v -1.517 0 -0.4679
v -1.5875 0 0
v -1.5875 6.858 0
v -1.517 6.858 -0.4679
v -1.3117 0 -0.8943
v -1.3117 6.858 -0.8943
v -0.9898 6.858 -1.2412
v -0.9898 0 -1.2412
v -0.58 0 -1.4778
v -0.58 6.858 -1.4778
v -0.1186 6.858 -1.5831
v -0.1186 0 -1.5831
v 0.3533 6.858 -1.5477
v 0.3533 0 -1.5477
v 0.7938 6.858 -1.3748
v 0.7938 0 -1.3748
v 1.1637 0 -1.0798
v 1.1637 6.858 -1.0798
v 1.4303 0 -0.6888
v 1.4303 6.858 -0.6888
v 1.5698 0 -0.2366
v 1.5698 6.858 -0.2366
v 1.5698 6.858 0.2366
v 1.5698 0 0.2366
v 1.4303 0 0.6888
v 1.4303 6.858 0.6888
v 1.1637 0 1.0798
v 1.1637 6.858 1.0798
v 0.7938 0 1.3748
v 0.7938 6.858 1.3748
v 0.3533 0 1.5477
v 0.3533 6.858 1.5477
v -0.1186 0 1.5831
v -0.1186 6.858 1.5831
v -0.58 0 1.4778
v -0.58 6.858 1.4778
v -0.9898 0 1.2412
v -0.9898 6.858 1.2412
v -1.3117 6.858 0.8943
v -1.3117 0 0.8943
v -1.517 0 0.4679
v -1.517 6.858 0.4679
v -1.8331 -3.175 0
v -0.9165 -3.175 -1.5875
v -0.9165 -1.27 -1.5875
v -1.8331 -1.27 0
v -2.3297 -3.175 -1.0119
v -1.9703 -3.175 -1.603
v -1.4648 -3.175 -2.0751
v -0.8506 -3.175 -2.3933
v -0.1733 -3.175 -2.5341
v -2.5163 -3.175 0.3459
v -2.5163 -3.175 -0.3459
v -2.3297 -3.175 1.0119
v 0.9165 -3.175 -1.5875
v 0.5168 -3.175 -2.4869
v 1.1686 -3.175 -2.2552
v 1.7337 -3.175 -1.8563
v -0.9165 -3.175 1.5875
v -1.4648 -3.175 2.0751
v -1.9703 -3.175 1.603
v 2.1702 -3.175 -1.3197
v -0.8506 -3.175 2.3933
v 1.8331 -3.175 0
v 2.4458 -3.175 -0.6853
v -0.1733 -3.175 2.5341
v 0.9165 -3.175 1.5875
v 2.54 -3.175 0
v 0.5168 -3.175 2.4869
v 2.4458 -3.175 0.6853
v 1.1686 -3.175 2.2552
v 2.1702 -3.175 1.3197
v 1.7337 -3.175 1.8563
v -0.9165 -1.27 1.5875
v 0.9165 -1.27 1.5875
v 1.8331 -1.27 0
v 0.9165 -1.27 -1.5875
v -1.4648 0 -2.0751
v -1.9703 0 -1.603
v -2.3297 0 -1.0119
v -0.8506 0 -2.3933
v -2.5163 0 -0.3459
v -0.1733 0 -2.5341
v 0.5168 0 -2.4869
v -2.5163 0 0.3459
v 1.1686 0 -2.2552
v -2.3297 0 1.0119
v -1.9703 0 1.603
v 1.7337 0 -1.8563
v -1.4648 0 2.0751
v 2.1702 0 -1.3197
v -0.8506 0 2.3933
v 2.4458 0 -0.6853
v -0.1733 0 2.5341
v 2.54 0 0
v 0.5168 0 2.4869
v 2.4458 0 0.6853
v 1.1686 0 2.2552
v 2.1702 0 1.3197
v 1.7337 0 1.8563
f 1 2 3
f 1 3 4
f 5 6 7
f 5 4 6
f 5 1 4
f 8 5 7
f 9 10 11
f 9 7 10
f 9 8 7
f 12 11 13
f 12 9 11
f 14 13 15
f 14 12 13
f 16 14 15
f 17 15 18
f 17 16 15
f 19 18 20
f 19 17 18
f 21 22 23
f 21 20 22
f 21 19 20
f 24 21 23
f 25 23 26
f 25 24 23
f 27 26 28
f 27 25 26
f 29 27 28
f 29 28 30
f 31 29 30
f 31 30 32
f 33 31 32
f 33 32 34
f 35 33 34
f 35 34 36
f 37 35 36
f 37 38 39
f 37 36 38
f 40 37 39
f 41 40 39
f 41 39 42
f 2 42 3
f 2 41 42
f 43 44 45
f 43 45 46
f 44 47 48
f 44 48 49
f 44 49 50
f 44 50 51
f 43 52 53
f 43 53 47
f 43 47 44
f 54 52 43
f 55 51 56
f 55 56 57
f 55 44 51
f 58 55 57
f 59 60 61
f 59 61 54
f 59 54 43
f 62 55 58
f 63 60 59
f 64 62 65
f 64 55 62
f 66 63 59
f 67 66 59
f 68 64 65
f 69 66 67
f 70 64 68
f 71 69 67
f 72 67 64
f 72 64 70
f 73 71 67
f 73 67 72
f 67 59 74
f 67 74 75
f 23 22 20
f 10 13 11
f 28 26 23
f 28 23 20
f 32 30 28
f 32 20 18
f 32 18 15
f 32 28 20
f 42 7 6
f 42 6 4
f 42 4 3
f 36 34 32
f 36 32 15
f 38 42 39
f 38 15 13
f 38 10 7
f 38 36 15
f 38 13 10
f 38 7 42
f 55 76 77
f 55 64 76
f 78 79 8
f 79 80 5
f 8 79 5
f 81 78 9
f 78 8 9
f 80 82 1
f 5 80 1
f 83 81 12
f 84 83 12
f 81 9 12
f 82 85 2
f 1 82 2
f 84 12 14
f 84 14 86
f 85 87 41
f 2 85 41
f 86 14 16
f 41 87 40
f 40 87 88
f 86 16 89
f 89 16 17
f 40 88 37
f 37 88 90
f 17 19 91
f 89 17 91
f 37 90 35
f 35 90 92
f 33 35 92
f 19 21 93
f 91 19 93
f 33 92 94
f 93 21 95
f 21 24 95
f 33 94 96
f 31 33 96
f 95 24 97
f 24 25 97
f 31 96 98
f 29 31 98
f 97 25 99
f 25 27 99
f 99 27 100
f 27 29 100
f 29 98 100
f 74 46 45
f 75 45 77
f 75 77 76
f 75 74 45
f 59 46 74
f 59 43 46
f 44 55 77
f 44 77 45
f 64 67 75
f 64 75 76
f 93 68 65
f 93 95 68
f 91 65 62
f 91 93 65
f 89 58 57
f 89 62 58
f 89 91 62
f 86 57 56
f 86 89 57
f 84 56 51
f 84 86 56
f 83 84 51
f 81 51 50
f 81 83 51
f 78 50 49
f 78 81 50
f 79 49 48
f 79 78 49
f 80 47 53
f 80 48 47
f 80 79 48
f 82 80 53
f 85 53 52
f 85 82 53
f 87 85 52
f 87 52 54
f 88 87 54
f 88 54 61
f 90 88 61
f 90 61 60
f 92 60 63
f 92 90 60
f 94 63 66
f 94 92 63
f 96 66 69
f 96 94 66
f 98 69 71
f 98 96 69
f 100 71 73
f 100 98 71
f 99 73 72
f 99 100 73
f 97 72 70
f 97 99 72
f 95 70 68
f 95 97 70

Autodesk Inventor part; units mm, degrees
ref_plane "YZ Plane" through (0, 0, 0) normal (1, 0, 0) x (0, 1, 0)
ref_plane "XZ Plane" through (0, 0, 0) normal (0, 1, 0) x (-1, 0, 0)
ref_plane "XY Plane" through (0, 0, 0) normal (0, 0, 1) x (1, 0, 0)
sketch "Sketch1" plane through (0, 0, 0) normal (0, 1, 0) x (-1, 0, 0)
  circle A0 centre (0, 0) radius 1.5875
  dimension "d0" = 3.175
extrude "Extrusion1" add sketch "Sketch1" along normal blind 6.858
sketch "Sketch2" plane through (0, 0, 0) normal (0, -1, 0) x (1, 0, 0)
  circle A0 centre (0, 0) radius 2.54
  dimension "d3" = 5.08
extrude "Extrusion2" add sketch "Sketch2" along normal blind 3.175
sketch "Sketch3" plane through (0, -3.175, 0) normal (0, -1, 0) x (1, 0, 0)
  line L0 (1.8331, 0) -> (0.9165, -1.5875)
  line L1 (0.9165, -1.5875) -> (-0.9165, -1.5875)
  line L2 (-0.9165, -1.5875) -> (-1.8331, 0)
  line L3 (-1.8331, 0) -> (-0.9165, 1.5875)
  line L4 (-0.9165, 1.5875) -> (0.9165, 1.5875)
  line L5 (0.9165, 1.5875) -> (1.8331, 0)
  point P0 (0, 0)
  point P1 (0, 0)
  dimension "d6" = 3.175
extrude "Extrusion3" cut sketch "Sketch3" against normal blind 1.905
thread "Thread1" size "5-40 UNC" class "2A" standard "ANSI Unified Screw Threads" full length
properties part number "Slide rod set screw" material "Steel, Galvanized"
